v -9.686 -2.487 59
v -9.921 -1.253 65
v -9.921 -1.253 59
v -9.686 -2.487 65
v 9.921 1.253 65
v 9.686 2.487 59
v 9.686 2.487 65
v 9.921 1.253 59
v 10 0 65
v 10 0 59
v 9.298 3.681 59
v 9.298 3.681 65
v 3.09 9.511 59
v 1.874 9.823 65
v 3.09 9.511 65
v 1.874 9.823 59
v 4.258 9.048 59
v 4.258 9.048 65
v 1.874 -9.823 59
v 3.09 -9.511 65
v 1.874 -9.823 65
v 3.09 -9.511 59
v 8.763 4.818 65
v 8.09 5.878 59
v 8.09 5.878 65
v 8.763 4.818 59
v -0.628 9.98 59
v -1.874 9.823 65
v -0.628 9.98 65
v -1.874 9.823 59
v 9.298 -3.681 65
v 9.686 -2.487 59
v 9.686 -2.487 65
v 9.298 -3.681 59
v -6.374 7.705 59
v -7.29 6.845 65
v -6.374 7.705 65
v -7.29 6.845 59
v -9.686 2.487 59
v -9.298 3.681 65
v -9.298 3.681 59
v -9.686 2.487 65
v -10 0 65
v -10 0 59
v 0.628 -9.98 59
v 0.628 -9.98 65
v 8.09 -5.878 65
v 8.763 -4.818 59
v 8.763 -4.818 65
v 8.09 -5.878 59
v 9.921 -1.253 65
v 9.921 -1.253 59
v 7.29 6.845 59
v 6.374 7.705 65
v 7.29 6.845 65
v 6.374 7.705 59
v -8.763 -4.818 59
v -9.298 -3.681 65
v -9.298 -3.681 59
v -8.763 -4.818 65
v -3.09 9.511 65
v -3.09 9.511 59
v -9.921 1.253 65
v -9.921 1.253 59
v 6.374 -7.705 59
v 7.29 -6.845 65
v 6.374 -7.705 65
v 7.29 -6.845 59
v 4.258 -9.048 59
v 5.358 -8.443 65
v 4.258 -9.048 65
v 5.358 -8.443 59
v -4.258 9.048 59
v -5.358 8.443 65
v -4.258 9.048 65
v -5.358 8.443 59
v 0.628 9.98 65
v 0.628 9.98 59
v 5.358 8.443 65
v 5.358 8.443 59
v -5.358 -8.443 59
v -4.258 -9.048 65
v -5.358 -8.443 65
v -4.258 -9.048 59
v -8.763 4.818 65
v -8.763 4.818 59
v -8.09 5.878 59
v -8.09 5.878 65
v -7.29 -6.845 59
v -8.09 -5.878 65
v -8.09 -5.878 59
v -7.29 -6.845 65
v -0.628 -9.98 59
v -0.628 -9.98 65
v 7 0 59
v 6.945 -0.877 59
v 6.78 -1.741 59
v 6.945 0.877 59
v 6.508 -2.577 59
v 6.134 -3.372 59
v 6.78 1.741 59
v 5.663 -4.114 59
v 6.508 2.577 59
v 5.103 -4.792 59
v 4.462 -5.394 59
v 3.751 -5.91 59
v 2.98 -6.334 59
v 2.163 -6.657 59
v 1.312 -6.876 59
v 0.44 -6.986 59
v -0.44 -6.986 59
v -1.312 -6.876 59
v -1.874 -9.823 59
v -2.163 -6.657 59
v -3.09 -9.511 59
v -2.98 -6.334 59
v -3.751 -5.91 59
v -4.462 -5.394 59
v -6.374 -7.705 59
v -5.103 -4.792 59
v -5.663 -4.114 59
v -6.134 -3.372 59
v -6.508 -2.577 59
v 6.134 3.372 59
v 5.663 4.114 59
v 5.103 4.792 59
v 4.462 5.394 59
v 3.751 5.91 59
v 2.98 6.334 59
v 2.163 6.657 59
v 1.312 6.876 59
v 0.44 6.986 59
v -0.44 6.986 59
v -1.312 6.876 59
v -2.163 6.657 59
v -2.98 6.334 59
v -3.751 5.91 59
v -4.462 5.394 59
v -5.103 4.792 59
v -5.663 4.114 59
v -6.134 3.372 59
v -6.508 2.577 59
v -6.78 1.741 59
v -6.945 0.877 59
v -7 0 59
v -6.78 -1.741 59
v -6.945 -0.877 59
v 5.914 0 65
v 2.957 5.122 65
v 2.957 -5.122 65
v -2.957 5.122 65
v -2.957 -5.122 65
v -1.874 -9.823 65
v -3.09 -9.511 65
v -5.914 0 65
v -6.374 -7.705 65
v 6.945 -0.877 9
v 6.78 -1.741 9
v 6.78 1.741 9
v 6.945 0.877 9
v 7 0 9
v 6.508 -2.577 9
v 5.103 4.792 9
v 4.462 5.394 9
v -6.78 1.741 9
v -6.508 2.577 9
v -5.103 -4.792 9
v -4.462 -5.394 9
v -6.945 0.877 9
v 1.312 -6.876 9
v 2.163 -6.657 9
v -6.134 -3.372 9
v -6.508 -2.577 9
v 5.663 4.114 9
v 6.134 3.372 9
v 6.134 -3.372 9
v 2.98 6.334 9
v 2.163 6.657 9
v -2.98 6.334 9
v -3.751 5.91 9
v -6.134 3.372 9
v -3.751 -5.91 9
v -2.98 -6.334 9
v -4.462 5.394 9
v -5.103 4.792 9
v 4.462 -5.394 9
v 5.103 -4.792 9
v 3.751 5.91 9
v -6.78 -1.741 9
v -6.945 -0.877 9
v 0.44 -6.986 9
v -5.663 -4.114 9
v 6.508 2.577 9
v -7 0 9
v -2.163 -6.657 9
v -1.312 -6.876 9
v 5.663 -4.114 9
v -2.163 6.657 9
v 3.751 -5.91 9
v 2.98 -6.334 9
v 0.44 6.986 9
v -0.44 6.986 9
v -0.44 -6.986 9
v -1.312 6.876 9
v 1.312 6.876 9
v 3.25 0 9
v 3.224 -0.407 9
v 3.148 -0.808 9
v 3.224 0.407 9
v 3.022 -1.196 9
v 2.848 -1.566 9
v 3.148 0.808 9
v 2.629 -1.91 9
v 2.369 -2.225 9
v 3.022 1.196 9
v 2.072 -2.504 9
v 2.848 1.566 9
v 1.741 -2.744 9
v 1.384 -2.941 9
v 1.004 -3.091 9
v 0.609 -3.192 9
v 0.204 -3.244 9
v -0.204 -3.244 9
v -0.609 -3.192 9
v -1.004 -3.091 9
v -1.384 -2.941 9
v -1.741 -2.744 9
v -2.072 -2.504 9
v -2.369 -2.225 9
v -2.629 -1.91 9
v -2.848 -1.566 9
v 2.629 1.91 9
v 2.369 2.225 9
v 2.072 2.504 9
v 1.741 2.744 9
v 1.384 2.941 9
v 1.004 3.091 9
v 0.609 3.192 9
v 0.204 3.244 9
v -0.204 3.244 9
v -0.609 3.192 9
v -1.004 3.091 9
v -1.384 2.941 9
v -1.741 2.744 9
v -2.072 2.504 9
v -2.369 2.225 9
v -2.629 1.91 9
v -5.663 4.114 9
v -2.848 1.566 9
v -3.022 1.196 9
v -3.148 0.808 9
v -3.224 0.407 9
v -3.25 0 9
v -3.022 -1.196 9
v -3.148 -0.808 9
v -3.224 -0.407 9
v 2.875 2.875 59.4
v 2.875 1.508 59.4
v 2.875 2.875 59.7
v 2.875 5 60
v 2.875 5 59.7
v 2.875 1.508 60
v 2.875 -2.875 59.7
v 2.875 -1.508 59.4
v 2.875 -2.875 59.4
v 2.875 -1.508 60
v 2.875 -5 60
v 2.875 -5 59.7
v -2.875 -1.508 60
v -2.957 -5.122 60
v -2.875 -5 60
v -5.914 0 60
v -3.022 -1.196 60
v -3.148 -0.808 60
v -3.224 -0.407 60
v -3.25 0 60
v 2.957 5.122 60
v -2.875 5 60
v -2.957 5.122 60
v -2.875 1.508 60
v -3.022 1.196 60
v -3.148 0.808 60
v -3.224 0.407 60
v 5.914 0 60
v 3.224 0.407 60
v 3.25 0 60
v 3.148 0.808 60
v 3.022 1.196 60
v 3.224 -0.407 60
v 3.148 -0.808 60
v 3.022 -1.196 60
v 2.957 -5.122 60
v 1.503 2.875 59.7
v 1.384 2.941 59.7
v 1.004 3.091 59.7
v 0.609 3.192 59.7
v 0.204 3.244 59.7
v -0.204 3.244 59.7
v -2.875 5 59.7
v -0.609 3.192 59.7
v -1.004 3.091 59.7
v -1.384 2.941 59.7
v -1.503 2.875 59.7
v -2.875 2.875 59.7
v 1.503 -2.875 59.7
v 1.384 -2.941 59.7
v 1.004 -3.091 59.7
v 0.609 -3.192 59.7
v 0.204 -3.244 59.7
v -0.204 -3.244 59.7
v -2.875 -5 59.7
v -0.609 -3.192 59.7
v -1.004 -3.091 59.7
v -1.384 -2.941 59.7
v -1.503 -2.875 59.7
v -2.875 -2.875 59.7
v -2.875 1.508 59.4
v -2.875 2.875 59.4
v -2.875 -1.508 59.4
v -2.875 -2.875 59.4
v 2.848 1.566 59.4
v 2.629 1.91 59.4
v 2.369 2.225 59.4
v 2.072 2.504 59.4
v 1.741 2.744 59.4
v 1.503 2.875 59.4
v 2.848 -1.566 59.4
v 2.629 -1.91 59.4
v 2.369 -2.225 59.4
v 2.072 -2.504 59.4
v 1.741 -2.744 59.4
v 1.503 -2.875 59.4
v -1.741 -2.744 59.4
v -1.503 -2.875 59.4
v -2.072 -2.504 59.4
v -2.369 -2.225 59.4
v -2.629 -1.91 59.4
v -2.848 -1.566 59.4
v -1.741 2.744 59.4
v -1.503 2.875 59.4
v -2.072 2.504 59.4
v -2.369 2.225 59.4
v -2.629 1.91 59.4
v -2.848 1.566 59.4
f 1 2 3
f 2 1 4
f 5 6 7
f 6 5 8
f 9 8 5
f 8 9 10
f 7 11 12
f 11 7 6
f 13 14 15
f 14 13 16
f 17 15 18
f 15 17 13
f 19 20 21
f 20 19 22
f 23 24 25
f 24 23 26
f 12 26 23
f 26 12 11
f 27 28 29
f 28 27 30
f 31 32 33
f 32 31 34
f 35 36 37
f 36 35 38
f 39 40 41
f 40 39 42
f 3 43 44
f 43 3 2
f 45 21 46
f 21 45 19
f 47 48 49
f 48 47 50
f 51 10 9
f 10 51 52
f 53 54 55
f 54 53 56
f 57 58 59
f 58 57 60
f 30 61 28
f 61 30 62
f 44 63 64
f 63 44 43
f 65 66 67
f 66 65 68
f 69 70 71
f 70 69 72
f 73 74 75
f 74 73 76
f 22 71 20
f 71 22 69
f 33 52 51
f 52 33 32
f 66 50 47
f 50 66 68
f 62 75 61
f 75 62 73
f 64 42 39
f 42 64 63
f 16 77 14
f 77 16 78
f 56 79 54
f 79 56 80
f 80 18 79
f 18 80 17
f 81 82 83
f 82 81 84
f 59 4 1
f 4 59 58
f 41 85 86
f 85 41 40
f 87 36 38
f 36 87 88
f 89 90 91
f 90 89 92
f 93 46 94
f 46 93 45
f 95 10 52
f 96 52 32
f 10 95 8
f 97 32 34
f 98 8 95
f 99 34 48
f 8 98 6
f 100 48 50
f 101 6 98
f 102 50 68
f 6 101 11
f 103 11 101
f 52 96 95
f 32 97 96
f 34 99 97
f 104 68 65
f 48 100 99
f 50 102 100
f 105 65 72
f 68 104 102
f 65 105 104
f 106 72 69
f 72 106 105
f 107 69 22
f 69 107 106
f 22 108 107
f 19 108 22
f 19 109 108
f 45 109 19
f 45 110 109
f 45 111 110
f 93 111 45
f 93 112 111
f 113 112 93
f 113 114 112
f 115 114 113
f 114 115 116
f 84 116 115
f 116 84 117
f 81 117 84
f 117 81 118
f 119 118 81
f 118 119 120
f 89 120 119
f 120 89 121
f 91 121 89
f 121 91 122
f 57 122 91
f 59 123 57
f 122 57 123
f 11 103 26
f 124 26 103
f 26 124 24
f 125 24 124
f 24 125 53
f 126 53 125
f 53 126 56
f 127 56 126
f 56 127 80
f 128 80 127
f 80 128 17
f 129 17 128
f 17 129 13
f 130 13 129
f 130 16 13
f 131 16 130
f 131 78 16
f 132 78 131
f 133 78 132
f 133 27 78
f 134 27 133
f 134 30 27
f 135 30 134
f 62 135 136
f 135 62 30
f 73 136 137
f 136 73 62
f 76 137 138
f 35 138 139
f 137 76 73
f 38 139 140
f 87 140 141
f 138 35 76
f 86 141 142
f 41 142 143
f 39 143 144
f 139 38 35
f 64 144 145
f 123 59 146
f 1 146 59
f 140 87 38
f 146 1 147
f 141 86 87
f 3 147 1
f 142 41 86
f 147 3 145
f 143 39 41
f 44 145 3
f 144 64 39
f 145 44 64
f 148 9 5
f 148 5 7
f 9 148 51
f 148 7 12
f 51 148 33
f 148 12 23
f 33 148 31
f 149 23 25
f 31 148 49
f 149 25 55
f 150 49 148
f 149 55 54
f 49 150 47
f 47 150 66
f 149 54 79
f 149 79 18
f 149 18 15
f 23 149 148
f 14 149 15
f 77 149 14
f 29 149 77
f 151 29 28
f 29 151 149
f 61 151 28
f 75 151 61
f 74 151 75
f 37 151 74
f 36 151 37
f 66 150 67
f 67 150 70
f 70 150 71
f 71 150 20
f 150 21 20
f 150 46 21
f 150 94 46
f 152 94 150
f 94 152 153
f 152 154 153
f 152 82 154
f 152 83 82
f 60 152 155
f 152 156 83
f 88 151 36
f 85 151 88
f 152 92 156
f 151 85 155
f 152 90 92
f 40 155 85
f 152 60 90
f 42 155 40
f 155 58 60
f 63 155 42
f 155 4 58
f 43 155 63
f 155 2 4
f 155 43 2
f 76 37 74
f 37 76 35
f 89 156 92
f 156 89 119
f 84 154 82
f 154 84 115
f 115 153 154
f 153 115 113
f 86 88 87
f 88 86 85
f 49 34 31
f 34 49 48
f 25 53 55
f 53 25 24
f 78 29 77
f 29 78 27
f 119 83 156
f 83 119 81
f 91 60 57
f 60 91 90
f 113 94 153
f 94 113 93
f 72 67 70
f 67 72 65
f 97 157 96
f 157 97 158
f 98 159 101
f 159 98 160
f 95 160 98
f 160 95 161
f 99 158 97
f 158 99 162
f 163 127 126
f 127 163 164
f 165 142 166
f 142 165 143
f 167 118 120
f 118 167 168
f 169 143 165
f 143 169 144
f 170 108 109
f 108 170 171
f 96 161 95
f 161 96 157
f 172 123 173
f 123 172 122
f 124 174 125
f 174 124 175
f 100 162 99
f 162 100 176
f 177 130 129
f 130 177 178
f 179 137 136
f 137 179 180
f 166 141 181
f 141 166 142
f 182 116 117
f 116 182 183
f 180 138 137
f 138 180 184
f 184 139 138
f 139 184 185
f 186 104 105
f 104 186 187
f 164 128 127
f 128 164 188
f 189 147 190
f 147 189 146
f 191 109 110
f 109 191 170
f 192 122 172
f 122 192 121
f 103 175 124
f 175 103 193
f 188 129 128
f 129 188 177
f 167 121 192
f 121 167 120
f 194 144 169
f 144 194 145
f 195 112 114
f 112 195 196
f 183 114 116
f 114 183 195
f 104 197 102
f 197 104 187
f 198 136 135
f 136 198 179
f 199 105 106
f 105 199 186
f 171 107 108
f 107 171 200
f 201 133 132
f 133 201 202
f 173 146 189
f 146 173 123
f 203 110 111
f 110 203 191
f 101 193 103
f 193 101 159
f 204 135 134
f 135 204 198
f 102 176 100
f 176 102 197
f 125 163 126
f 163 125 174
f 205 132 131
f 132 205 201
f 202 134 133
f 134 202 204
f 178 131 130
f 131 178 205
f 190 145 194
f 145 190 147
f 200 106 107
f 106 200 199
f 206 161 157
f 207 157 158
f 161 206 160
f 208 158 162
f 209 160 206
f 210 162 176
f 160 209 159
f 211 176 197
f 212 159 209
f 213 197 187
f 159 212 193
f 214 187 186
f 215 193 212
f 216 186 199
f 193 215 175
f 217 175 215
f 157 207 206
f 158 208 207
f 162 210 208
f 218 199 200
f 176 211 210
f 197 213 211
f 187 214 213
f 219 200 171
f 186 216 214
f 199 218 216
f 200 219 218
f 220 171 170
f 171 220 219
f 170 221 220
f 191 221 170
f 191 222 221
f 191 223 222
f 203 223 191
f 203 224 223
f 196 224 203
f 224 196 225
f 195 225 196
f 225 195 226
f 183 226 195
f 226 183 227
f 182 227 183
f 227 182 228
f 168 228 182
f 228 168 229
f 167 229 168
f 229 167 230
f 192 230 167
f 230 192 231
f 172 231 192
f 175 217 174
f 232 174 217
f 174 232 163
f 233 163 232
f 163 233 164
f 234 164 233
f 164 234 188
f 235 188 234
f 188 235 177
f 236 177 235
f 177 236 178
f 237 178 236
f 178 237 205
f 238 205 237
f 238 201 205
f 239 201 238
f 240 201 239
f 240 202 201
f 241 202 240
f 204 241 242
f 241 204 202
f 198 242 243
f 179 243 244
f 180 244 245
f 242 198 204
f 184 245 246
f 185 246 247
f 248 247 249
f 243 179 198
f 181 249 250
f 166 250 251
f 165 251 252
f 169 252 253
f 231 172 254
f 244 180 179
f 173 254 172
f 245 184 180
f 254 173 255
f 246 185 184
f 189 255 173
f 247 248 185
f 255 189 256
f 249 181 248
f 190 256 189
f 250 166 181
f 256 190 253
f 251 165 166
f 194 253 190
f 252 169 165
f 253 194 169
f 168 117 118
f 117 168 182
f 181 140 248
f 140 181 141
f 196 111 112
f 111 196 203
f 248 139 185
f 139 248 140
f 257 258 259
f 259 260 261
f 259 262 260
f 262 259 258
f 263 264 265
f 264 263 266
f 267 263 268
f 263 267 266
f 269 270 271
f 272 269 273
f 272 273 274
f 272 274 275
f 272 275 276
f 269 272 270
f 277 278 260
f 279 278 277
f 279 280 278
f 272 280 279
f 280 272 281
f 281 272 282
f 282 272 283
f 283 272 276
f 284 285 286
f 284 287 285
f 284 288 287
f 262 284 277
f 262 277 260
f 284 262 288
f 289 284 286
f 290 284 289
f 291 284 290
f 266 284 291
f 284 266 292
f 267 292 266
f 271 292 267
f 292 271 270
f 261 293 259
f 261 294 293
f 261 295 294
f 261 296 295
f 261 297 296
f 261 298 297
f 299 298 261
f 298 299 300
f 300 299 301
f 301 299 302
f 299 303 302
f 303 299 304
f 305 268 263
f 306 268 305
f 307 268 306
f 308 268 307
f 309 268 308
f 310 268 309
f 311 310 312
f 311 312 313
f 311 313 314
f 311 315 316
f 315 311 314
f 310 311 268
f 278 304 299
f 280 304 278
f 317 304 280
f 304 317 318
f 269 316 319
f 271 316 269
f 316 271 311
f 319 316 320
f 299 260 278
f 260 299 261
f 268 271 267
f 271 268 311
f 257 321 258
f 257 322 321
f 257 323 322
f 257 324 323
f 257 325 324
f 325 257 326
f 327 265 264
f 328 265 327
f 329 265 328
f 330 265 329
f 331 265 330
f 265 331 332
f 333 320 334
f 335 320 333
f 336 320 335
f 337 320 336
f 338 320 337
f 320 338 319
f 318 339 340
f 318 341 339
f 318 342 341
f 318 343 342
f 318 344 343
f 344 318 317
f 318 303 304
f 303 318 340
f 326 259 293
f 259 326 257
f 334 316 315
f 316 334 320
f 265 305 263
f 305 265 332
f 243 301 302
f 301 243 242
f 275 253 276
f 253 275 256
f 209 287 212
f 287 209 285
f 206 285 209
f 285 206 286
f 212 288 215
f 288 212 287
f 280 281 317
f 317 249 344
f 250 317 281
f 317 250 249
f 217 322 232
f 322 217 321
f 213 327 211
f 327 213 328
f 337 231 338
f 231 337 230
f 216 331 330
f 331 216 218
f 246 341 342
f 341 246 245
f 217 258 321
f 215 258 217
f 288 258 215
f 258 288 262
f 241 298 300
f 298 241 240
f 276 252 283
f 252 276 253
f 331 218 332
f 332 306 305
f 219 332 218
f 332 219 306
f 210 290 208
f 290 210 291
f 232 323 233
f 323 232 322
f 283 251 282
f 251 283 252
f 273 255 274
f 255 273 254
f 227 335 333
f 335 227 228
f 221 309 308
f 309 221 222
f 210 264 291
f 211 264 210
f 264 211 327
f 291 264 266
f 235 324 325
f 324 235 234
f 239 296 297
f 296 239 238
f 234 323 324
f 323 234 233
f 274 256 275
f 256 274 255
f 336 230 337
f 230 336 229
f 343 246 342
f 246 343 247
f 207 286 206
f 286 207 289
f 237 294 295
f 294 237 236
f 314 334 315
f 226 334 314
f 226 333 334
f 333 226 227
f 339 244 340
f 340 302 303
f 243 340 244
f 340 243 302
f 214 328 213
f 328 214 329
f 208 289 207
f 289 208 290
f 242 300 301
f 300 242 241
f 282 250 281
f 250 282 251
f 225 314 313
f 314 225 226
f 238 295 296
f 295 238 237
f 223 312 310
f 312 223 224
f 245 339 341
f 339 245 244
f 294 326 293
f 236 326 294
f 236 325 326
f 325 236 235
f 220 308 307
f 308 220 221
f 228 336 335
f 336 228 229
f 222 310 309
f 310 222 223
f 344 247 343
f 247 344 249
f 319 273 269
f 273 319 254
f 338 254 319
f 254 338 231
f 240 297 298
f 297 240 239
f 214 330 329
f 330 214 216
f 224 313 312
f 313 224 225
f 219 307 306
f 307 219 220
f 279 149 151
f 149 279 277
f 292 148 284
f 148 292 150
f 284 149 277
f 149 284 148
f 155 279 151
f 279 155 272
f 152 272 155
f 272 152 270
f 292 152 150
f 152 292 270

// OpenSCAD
$fn = 50;


difference() {
	union() {
		translate(v = [0, 0, 59.0000000000]) {
			cylinder(h = 6, r = 10.0000000000);
		}
		translate(v = [0, 0, 9.0000000000]) {
			cylinder(h = 56, r = 7.0000000000);
		}
	}
	union() {
		translate(v = [0, 0, 65]) {
			rotate(a = [0, 0, 0]) {
				difference() {
					union() {
						#translate(v = [-2.8750000000, -5.0000000000, -5.3000000000]) {
							cube(size = [5.7500000000, 10, 0.3000000000]);
						}
						#translate(v = [-2.8750000000, -2.8750000000, -5.6000000000]) {
							cube(size = [5.7500000000, 5.7500000000, 0.3000000000]);
						}
						#translate(v = [-2.8750000000, -5.0000000000, 0]) {
							cube(size = [5.7500000000, 10, 0.3000000000]);
						}
						#translate(v = [-2.8750000000, -2.8750000000, 0.3000000000]) {
							cube(size = [5.7500000000, 5.7500000000, 0.3000000000]);
						}
						#translate(v = [0, 0, -100.0000000000]) {
							cylinder(h = 200, r = 3.2500000000);
						}
						translate(v = [0, 0, -5]) {
							#linear_extrude(height = 5) {
								polygon(points = [[5.9142500000, 0.0000000000], [2.9571250000, 5.1218907443], [-2.9571250000, 5.1218907443], [-5.9142500000, 0.0000000000], [-2.9571250000, -5.1218907443], [2.9571250000, -5.1218907443]]);
							}
						}
						#translate(v = [-2.8750000000, -5.0000000000, -5.3000000000]) {
							cube(size = [5.7500000000, 10, 0.3000000000]);
						}
						#translate(v = [-2.8750000000, -2.8750000000, -5.6000000000]) {
							cube(size = [5.7500000000, 5.7500000000, 0.3000000000]);
						}
						#translate(v = [-2.8750000000, -5.0000000000, 0]) {
							cube(size = [5.7500000000, 10, 0.3000000000]);
						}
						#translate(v = [-2.8750000000, -2.8750000000, 0.3000000000]) {
							cube(size = [5.7500000000, 5.7500000000, 0.3000000000]);
						}
						#translate(v = [0, 0, -100.0000000000]) {
							cylinder(h = 200, r = 3.2500000000);
						}
						#translate(v = [-2.8750000000, -5.0000000000, -5.3000000000]) {
							cube(size = [5.7500000000, 10, 0.3000000000]);
						}
						#translate(v = [-2.8750000000, -2.8750000000, -5.6000000000]) {
							cube(size = [5.7500000000, 5.7500000000, 0.3000000000]);
						}
						#translate(v = [-2.8750000000, -5.0000000000, 0]) {
							cube(size = [5.7500000000, 10, 0.3000000000]);
						}
						#translate(v = [-2.8750000000, -2.8750000000, 0.3000000000]) {
							cube(size = [5.7500000000, 5.7500000000, 0.3000000000]);
						}
						#translate(v = [0, 0, -100.0000000000]) {
							cylinder(h = 200, r = 3.2500000000);
						}
					}
					union();
				}
			}
		}
		#translate(v = [0, 0, -100.0000000000]) {
			cylinder(h = 200, r = 3.2500000000);
		}
	}
}
